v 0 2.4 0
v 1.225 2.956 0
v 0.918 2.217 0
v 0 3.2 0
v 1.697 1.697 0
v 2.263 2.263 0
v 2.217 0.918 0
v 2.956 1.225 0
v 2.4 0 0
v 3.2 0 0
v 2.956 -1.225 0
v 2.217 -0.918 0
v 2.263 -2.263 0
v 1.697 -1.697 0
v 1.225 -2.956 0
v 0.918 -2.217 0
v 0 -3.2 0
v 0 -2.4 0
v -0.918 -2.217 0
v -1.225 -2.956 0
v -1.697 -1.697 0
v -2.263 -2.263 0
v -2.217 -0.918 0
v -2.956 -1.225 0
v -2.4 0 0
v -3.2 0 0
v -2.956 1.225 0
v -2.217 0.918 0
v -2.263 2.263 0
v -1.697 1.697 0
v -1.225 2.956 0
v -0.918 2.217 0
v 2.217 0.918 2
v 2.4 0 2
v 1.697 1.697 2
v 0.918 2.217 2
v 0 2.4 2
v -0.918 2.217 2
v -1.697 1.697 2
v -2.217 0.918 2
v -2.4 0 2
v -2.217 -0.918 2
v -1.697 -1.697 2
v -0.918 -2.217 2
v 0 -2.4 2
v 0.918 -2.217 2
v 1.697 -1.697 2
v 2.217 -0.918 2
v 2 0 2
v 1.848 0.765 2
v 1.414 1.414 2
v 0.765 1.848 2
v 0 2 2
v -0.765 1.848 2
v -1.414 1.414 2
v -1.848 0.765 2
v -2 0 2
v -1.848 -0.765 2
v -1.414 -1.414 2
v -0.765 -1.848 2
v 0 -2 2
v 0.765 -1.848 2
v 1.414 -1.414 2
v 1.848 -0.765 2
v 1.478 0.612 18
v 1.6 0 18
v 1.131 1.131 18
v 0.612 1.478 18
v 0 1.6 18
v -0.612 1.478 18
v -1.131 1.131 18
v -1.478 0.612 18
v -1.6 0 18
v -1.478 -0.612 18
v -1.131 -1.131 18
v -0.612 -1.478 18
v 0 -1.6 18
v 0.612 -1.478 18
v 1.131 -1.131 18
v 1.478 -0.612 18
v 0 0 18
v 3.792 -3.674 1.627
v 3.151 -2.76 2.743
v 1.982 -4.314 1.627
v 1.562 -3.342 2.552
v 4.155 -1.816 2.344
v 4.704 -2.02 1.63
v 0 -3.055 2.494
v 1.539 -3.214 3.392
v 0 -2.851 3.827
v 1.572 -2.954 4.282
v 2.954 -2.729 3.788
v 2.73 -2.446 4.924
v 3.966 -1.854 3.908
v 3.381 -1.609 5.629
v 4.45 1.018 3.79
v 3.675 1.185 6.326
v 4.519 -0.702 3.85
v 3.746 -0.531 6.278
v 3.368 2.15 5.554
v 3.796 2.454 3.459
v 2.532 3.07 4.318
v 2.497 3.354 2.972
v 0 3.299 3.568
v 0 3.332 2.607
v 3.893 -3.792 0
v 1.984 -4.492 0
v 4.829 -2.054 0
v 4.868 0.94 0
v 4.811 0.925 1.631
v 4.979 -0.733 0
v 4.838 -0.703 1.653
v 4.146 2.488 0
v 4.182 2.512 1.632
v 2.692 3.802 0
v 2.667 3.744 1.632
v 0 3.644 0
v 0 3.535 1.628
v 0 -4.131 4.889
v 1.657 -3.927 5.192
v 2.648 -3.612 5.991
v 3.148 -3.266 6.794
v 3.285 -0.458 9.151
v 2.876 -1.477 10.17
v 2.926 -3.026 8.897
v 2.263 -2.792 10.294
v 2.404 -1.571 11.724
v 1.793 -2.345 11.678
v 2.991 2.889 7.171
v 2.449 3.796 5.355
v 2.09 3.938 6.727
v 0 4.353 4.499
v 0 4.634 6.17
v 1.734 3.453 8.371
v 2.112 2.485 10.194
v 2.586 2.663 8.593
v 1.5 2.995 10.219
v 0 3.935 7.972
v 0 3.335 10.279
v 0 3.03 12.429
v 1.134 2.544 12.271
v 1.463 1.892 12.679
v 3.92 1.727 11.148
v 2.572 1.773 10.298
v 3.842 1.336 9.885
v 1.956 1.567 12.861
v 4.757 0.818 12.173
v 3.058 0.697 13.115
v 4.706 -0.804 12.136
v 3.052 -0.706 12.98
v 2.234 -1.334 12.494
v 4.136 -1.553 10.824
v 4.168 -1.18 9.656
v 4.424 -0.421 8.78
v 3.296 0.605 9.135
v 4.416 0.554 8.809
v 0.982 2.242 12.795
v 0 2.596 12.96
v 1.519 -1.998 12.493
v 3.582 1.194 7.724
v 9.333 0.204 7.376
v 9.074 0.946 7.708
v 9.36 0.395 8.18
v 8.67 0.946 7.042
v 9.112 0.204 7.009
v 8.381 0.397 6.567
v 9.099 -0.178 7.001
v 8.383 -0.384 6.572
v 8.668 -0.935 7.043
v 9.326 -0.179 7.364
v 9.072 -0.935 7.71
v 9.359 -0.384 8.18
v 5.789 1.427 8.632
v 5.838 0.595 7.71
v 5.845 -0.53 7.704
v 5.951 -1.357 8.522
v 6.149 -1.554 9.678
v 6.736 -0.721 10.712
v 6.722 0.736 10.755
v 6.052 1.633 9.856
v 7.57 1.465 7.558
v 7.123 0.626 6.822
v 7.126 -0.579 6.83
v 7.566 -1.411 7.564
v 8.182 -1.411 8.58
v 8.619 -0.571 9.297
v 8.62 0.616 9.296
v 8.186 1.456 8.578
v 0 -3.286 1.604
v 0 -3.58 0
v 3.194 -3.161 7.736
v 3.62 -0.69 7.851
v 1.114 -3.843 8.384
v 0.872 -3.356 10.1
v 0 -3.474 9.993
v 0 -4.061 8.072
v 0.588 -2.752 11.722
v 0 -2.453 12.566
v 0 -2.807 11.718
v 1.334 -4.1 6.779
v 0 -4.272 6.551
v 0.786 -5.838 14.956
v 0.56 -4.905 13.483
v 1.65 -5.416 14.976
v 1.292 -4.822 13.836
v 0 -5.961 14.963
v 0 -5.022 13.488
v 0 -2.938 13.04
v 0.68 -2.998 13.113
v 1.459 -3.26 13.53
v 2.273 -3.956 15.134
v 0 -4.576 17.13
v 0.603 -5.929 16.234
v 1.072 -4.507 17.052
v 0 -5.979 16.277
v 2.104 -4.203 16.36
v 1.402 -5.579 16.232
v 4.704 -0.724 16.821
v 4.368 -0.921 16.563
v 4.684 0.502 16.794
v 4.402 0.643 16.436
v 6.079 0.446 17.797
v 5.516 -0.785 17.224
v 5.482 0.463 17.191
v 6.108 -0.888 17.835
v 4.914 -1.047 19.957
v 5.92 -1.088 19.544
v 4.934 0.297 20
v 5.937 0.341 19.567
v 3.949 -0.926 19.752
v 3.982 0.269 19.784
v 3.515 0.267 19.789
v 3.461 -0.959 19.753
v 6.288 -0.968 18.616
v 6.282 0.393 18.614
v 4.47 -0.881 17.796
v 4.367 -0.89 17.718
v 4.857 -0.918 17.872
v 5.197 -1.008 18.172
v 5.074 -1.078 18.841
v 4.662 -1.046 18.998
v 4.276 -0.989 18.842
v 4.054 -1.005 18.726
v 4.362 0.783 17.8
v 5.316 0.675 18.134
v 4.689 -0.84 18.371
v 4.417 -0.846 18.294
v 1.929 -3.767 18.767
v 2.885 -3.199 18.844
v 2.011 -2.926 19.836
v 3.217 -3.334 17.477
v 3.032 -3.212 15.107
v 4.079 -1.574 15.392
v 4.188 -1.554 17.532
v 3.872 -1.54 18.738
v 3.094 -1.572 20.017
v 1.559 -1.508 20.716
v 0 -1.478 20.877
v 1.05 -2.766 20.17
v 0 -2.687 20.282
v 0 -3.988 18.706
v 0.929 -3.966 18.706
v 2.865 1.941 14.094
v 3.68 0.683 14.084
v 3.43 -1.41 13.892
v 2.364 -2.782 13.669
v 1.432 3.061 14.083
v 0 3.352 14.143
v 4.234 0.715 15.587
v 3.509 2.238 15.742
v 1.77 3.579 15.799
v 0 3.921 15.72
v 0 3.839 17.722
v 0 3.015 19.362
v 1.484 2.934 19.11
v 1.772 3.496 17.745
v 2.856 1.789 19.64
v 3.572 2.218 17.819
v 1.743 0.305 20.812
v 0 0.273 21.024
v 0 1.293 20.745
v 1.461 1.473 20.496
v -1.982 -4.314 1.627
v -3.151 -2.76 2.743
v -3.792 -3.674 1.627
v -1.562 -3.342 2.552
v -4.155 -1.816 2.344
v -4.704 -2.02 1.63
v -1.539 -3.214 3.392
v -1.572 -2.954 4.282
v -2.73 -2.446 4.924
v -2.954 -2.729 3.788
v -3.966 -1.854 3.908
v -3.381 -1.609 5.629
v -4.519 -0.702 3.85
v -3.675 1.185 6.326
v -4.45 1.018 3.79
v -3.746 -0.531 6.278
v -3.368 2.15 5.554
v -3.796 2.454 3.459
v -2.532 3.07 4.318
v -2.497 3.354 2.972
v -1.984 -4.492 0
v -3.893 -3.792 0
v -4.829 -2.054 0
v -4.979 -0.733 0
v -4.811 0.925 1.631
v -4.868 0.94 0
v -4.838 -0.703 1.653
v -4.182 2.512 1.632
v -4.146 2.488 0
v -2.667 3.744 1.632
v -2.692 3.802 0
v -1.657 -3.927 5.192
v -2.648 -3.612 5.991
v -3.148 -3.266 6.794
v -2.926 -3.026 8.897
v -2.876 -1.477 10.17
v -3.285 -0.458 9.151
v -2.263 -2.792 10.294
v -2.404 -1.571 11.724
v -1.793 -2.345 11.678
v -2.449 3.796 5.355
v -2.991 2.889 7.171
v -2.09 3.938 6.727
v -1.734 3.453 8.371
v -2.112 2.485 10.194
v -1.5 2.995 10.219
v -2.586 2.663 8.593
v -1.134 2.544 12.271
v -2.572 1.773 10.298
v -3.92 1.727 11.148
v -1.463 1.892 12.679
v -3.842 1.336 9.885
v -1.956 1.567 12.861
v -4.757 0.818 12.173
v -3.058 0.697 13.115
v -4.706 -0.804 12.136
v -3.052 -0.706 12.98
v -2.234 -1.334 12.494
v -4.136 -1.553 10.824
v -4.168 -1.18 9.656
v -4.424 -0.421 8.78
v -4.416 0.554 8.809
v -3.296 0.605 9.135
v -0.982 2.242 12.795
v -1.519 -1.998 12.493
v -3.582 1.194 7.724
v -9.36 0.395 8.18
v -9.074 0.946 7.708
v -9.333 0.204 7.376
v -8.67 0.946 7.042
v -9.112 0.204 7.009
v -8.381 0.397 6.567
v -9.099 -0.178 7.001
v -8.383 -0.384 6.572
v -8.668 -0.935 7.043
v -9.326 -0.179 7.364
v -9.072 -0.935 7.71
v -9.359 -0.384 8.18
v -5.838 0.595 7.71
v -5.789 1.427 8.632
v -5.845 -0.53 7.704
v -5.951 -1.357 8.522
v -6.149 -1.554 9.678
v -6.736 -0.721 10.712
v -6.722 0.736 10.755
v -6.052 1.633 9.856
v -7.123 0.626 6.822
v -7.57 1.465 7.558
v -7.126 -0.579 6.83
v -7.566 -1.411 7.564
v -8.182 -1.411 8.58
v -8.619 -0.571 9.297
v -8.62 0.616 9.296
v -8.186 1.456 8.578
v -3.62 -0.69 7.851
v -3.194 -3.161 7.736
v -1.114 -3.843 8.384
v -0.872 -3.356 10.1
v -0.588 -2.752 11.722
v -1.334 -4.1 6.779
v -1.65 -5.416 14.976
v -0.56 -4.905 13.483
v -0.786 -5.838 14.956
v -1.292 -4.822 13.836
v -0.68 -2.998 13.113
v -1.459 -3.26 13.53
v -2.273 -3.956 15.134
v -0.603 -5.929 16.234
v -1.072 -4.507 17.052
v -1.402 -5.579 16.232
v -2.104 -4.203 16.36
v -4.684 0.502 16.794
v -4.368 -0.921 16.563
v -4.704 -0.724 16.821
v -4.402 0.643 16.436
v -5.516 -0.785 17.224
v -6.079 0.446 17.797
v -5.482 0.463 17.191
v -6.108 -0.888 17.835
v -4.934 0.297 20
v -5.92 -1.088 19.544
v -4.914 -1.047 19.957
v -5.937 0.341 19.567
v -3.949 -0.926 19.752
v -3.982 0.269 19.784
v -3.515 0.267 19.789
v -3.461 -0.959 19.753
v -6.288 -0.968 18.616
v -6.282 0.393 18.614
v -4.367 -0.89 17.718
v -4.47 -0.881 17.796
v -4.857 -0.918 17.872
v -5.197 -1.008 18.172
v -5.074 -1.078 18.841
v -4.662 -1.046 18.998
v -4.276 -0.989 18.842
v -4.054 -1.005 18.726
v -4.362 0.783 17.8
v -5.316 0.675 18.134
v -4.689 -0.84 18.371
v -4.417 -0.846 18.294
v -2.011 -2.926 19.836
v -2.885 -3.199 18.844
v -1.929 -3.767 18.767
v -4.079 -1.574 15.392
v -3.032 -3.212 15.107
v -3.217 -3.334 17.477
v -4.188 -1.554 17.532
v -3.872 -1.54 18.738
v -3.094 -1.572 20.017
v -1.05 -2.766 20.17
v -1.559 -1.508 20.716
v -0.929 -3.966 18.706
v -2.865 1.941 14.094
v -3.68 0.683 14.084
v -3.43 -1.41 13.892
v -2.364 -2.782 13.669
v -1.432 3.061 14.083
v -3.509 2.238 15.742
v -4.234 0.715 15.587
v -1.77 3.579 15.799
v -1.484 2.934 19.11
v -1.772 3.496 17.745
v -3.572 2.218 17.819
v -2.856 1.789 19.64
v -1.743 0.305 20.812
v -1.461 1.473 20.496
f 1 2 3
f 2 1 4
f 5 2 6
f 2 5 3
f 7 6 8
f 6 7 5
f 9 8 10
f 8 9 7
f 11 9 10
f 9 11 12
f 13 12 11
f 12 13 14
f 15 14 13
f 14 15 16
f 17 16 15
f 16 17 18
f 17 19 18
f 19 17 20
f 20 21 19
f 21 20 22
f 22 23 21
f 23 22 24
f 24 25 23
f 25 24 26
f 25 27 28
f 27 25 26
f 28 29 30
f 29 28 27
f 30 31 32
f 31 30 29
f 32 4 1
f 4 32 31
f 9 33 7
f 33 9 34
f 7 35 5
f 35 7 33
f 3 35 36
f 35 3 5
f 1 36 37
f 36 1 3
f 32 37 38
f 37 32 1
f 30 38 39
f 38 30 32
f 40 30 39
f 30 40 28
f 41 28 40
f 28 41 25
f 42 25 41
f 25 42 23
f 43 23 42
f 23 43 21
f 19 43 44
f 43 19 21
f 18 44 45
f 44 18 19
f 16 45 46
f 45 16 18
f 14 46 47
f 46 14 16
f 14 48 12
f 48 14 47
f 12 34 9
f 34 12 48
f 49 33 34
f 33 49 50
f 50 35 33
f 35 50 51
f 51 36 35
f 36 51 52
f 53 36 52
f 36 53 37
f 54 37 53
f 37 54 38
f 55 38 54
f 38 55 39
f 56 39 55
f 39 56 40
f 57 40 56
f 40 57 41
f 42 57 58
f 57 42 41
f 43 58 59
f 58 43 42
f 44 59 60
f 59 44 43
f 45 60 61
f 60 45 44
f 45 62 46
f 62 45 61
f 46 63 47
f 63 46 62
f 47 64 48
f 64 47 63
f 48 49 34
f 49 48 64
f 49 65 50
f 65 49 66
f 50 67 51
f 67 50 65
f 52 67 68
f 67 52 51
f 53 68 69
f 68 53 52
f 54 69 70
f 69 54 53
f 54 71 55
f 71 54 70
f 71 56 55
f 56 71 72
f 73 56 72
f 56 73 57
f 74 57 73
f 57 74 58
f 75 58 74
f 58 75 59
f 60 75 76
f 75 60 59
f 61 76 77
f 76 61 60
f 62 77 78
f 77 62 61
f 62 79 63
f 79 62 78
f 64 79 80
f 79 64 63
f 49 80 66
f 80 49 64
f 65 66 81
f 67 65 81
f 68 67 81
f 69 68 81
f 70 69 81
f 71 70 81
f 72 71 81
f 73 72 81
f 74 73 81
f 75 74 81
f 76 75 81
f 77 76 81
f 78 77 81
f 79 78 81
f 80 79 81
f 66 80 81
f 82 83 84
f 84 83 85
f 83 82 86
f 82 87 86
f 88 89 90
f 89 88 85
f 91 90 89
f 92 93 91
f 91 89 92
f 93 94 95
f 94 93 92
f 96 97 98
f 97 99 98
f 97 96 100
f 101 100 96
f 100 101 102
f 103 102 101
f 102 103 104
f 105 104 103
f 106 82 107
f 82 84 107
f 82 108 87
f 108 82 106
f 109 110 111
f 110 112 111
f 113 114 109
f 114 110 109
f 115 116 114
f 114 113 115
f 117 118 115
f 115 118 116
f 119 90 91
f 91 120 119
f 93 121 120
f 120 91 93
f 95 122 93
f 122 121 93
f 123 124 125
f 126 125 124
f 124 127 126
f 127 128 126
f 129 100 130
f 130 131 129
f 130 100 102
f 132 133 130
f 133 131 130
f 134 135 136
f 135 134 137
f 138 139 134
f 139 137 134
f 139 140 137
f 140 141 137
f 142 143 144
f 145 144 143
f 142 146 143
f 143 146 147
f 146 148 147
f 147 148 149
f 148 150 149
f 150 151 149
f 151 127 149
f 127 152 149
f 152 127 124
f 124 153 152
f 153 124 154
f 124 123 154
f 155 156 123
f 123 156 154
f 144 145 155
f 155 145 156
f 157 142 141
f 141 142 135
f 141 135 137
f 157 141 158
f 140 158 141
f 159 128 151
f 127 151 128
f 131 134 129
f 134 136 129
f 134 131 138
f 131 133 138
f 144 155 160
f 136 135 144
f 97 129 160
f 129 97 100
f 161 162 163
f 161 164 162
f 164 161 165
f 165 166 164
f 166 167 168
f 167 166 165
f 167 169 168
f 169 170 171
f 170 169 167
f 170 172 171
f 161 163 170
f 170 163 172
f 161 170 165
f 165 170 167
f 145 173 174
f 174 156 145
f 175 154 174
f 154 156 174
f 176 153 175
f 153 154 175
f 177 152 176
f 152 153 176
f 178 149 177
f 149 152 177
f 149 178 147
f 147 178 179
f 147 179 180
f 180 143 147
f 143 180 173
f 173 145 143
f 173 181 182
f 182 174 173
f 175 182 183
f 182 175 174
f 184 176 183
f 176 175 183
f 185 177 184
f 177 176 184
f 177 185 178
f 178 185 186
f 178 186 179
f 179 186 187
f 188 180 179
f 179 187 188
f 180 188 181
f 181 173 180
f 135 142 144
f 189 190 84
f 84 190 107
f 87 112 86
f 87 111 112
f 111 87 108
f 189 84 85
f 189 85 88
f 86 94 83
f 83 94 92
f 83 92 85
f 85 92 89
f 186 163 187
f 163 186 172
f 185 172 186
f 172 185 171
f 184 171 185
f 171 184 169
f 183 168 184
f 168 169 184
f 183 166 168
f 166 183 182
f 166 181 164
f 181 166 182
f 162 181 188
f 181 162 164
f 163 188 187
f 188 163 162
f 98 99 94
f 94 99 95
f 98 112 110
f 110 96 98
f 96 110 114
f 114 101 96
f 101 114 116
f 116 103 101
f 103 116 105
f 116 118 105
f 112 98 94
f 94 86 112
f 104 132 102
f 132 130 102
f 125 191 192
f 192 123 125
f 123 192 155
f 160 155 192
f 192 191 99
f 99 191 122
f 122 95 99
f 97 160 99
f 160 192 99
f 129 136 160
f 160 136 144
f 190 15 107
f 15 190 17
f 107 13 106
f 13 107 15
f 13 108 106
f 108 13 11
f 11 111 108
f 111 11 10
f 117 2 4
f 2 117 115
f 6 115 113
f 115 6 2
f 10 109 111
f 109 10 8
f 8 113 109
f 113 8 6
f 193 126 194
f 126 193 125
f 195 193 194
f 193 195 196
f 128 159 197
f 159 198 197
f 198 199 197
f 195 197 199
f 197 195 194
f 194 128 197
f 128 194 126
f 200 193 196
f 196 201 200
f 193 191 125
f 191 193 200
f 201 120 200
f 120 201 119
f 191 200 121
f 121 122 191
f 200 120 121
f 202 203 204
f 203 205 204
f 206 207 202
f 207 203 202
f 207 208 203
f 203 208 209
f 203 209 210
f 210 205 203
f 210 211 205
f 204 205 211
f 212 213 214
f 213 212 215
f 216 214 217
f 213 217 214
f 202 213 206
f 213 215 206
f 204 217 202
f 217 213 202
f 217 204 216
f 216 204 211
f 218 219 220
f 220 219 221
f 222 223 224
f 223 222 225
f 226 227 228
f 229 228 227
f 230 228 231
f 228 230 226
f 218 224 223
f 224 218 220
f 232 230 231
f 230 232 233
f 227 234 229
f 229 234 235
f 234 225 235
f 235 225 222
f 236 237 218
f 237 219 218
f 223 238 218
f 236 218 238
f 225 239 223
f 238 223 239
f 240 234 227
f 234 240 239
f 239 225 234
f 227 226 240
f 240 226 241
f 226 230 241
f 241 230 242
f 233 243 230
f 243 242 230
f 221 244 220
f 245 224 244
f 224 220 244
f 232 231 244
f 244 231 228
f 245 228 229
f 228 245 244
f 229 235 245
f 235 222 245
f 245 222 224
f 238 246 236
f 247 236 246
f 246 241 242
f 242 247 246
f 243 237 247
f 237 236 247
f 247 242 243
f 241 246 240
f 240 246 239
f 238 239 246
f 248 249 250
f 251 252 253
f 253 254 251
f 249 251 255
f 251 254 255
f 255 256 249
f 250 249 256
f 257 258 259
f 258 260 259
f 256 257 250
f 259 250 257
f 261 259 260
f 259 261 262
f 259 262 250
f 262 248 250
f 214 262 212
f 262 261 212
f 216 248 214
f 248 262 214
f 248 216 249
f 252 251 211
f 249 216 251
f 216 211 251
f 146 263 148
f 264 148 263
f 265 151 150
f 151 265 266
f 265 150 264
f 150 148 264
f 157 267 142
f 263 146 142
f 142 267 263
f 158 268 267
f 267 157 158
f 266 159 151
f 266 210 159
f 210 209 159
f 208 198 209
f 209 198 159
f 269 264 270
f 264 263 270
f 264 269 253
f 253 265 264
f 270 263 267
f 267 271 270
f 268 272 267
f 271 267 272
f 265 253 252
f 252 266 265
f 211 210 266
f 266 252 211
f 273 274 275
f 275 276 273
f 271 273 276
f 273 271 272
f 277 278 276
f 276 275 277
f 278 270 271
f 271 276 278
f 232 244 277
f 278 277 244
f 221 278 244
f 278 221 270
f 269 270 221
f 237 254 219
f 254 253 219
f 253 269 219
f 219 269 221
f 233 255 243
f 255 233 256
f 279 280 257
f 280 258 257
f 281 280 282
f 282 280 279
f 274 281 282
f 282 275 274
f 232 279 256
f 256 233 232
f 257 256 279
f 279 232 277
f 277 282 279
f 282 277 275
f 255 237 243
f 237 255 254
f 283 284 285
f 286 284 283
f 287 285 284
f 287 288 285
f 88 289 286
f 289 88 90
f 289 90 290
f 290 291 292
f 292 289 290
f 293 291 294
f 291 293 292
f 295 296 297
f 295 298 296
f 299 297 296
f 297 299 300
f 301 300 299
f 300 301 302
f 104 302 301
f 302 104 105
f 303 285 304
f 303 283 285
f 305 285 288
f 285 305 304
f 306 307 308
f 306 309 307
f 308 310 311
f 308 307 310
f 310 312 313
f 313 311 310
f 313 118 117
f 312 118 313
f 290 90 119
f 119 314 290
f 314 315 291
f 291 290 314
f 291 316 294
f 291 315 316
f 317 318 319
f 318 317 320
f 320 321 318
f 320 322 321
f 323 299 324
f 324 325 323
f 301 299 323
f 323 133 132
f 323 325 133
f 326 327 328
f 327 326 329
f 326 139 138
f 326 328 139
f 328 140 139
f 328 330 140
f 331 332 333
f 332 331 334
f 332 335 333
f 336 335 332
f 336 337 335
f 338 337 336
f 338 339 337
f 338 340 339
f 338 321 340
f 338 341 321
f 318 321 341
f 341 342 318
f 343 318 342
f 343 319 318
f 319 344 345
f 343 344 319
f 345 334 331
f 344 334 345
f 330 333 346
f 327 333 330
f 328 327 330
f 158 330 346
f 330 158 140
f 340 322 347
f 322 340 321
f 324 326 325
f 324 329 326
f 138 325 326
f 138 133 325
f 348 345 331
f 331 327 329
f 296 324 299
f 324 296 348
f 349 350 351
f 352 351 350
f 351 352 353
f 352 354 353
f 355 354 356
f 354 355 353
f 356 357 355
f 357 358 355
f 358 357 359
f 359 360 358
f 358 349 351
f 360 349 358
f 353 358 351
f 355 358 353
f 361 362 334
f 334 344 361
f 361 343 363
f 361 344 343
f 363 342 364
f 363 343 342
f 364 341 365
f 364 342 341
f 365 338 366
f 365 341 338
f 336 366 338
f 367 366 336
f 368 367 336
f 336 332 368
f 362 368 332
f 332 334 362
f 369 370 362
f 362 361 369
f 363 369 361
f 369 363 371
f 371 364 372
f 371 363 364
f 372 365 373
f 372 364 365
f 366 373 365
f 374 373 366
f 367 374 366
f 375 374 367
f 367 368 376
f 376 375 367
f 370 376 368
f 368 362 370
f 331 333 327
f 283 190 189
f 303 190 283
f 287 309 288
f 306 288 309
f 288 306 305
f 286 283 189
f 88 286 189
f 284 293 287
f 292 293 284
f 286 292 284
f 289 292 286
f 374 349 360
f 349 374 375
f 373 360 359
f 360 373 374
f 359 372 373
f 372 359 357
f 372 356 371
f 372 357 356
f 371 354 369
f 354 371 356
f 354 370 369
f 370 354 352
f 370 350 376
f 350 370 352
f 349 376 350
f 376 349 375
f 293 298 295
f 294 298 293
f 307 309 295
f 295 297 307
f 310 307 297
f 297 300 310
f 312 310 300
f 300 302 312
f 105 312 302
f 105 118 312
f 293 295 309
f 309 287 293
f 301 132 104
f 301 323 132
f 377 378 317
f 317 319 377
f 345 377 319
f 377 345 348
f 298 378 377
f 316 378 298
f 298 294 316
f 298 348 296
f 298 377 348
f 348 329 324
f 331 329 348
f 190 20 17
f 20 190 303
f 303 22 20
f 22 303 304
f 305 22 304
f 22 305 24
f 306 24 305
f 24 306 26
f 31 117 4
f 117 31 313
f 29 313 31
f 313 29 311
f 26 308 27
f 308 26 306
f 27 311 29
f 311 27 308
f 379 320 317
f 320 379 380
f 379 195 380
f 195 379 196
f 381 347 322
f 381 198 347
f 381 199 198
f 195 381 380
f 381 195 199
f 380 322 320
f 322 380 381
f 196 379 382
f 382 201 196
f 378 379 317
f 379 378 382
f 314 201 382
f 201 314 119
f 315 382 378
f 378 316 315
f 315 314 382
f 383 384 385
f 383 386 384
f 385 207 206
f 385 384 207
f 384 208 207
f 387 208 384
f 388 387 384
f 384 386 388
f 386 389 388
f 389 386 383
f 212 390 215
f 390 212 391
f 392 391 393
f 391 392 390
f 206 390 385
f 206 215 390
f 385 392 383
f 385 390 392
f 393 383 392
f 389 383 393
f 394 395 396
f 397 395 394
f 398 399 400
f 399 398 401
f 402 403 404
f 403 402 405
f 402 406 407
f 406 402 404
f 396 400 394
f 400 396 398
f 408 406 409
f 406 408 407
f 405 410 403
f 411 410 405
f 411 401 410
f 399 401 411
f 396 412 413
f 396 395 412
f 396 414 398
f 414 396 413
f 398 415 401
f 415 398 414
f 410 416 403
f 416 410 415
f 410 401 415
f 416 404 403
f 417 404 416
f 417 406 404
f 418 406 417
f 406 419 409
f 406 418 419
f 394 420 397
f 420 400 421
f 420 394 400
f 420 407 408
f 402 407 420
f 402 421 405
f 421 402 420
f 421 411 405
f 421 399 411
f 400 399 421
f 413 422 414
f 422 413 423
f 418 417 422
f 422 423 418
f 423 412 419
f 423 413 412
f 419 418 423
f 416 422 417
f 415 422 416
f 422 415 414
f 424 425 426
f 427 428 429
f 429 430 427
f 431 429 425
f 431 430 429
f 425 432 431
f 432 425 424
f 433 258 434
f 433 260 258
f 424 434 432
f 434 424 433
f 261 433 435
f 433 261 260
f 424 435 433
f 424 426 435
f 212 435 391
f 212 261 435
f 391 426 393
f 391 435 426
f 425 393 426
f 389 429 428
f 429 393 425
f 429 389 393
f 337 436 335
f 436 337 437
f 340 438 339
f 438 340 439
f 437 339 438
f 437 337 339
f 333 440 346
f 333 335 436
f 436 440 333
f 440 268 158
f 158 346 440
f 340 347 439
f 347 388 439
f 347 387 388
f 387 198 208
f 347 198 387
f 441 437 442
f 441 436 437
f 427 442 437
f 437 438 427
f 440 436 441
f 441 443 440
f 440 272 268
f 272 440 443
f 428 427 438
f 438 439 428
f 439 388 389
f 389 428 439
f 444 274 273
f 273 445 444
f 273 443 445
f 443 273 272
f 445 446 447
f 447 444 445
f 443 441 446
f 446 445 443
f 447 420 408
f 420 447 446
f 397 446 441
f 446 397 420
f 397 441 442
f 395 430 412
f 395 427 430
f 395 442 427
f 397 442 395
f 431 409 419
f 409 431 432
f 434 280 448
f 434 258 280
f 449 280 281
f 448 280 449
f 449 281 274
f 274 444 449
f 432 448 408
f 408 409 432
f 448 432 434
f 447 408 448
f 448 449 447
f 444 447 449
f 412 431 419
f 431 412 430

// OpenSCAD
use <../lib.scad>
use <../p/4-4con4.scad>
use <../p/4-4disc.scad>
use <../p/4-4edge.scad>
use <../p/4-4ring5.scad>
use <s/98382s01.scad>
use <s/98382s02.scad>
use <s/98382s03.scad>
use <s/98382s04.scad>
use <s/98382s05.scad>
use <s/98382s06.scad>
use <../p/stud4od.scad>
function ldraw_lib__98382() = [
// 0 Minifig Teddy Bear with Arms Down
// 0 Name: 98382.dat
// 0 Author: Philippe Hurbain [Philo]
// 0 !LDRAW_ORG Part UPDATE 2017-01
// 0 !LICENSE Licensed under CC BY 2.0 and CC BY 4.0 : see CAreadme.txt
// 
// 0 BFC CERTIFY CCW
  [0,"BFC","CERTIFY"],
  [0,"BFC","CCW"],
// 
// 0 !CATEGORY Minifig Accessory
// 0 !KEYWORDS animal, Toy
// 
// 0 !HISTORY 2013-08-14 {LEGO Digital Designer} Original part shape
// 0 !HISTORY 2017-02-20 [Philo] File preparation for LDraw Parts Tracker
// 0 !HISTORY 2017-12-30 [PTadmin] Official Update 2017-01
// 
// 
// 1 16 0 -5 0 -1 0 0 0 -1.25 0 0 0 1 stud4od.dat
  [1,16,0,-5,0,-1,0,0,0,-1.25,0,0,0,1, ldraw_lib__stud4od()],
// 1 16 0 -5 0 1 0 0 0 -1 0 0 0 1 4-4ring5.dat
  [1,16,0,-5,0,1,0,0,0,-1,0,0,0,1, ldraw_lib__4_4ring5()],
// 1 16 0 -5 0 5 0 0 0 -1 0 0 0 5 4-4edge.dat
  [1,16,0,-5,0,5,0,0,0,-1,0,0,0,5, ldraw_lib__4_4edge()],
// 0 BFC INVERTNEXT
  [0,"BFC","INVERTNEXT"],
// 1 16 0 -5 0 1 0 0 0 -40 0 0 0 1 4-4con4.dat
  [1,16,0,-5,0,1,0,0,0,-40,0,0,0,1, ldraw_lib__4_4con4()],
// 1 16 0 -45 0 4 0 0 0 -1 0 0 0 4 4-4edge.dat
  [1,16,0,-45,0,4,0,0,0,-1,0,0,0,4, ldraw_lib__4_4edge()],
// 1 16 0 -45 0 4 0 0 0 -1 0 0 0 4 4-4disc.dat
  [1,16,0,-45,0,4,0,0,0,-1,0,0,0,4, ldraw_lib__4_4disc()],
// 
// 1 16 0 0 0 1 0 0 0 1 0 0 0 1 s\98382s01.dat
  [1,16,0,0,0,1,0,0,0,1,0,0,0,1, ldraw_lib__s__98382s01()],
// 1 16 0 0 0 1 0 0 0 1 0 0 0 1 s\98382s02.dat
  [1,16,0,0,0,1,0,0,0,1,0,0,0,1, ldraw_lib__s__98382s02()],
// 1 16 0 0 0 1 0 0 0 1 0 0 0 1 s\98382s03.dat
  [1,16,0,0,0,1,0,0,0,1,0,0,0,1, ldraw_lib__s__98382s03()],
// 1 16 0 0 0 1 0 0 0 1 0 0 0 1 s\98382s04.dat
  [1,16,0,0,0,1,0,0,0,1,0,0,0,1, ldraw_lib__s__98382s04()],
// 1 16 0 0 0 1 0 0 0 1 0 0 0 1 s\98382s05.dat
  [1,16,0,0,0,1,0,0,0,1,0,0,0,1, ldraw_lib__s__98382s05()],
// 1 16 0 0 0 1 0 0 0 1 0 0 0 1 s\98382s06.dat
  [1,16,0,0,0,1,0,0,0,1,0,0,0,1, ldraw_lib__s__98382s06()],
// 1 16 0 0 0 -1 0 0 0 1 0 0 0 1 s\98382s01.dat
  [1,16,0,0,0,-1,0,0,0,1,0,0,0,1, ldraw_lib__s__98382s01()],
// 1 16 0 0 0 -1 0 0 0 1 0 0 0 1 s\98382s02.dat
  [1,16,0,0,0,-1,0,0,0,1,0,0,0,1, ldraw_lib__s__98382s02()],
// 1 16 0 0 0 -1 0 0 0 1 0 0 0 1 s\98382s03.dat
  [1,16,0,0,0,-1,0,0,0,1,0,0,0,1, ldraw_lib__s__98382s03()],
// 1 16 0 0 0 -1 0 0 0 1 0 0 0 1 s\98382s04.dat
  [1,16,0,0,0,-1,0,0,0,1,0,0,0,1, ldraw_lib__s__98382s04()],
// 1 16 0 0 0 -1 0 0 0 1 0 0 0 1 s\98382s05.dat
  [1,16,0,0,0,-1,0,0,0,1,0,0,0,1, ldraw_lib__s__98382s05()],
// 1 16 0 0 0 -1 0 0 0 1 0 0 0 1 s\98382s06.dat
  [1,16,0,0,0,-1,0,0,0,1,0,0,0,1, ldraw_lib__s__98382s06()],
];
makepoly(ldraw_lib__98382(), line=0.2);
